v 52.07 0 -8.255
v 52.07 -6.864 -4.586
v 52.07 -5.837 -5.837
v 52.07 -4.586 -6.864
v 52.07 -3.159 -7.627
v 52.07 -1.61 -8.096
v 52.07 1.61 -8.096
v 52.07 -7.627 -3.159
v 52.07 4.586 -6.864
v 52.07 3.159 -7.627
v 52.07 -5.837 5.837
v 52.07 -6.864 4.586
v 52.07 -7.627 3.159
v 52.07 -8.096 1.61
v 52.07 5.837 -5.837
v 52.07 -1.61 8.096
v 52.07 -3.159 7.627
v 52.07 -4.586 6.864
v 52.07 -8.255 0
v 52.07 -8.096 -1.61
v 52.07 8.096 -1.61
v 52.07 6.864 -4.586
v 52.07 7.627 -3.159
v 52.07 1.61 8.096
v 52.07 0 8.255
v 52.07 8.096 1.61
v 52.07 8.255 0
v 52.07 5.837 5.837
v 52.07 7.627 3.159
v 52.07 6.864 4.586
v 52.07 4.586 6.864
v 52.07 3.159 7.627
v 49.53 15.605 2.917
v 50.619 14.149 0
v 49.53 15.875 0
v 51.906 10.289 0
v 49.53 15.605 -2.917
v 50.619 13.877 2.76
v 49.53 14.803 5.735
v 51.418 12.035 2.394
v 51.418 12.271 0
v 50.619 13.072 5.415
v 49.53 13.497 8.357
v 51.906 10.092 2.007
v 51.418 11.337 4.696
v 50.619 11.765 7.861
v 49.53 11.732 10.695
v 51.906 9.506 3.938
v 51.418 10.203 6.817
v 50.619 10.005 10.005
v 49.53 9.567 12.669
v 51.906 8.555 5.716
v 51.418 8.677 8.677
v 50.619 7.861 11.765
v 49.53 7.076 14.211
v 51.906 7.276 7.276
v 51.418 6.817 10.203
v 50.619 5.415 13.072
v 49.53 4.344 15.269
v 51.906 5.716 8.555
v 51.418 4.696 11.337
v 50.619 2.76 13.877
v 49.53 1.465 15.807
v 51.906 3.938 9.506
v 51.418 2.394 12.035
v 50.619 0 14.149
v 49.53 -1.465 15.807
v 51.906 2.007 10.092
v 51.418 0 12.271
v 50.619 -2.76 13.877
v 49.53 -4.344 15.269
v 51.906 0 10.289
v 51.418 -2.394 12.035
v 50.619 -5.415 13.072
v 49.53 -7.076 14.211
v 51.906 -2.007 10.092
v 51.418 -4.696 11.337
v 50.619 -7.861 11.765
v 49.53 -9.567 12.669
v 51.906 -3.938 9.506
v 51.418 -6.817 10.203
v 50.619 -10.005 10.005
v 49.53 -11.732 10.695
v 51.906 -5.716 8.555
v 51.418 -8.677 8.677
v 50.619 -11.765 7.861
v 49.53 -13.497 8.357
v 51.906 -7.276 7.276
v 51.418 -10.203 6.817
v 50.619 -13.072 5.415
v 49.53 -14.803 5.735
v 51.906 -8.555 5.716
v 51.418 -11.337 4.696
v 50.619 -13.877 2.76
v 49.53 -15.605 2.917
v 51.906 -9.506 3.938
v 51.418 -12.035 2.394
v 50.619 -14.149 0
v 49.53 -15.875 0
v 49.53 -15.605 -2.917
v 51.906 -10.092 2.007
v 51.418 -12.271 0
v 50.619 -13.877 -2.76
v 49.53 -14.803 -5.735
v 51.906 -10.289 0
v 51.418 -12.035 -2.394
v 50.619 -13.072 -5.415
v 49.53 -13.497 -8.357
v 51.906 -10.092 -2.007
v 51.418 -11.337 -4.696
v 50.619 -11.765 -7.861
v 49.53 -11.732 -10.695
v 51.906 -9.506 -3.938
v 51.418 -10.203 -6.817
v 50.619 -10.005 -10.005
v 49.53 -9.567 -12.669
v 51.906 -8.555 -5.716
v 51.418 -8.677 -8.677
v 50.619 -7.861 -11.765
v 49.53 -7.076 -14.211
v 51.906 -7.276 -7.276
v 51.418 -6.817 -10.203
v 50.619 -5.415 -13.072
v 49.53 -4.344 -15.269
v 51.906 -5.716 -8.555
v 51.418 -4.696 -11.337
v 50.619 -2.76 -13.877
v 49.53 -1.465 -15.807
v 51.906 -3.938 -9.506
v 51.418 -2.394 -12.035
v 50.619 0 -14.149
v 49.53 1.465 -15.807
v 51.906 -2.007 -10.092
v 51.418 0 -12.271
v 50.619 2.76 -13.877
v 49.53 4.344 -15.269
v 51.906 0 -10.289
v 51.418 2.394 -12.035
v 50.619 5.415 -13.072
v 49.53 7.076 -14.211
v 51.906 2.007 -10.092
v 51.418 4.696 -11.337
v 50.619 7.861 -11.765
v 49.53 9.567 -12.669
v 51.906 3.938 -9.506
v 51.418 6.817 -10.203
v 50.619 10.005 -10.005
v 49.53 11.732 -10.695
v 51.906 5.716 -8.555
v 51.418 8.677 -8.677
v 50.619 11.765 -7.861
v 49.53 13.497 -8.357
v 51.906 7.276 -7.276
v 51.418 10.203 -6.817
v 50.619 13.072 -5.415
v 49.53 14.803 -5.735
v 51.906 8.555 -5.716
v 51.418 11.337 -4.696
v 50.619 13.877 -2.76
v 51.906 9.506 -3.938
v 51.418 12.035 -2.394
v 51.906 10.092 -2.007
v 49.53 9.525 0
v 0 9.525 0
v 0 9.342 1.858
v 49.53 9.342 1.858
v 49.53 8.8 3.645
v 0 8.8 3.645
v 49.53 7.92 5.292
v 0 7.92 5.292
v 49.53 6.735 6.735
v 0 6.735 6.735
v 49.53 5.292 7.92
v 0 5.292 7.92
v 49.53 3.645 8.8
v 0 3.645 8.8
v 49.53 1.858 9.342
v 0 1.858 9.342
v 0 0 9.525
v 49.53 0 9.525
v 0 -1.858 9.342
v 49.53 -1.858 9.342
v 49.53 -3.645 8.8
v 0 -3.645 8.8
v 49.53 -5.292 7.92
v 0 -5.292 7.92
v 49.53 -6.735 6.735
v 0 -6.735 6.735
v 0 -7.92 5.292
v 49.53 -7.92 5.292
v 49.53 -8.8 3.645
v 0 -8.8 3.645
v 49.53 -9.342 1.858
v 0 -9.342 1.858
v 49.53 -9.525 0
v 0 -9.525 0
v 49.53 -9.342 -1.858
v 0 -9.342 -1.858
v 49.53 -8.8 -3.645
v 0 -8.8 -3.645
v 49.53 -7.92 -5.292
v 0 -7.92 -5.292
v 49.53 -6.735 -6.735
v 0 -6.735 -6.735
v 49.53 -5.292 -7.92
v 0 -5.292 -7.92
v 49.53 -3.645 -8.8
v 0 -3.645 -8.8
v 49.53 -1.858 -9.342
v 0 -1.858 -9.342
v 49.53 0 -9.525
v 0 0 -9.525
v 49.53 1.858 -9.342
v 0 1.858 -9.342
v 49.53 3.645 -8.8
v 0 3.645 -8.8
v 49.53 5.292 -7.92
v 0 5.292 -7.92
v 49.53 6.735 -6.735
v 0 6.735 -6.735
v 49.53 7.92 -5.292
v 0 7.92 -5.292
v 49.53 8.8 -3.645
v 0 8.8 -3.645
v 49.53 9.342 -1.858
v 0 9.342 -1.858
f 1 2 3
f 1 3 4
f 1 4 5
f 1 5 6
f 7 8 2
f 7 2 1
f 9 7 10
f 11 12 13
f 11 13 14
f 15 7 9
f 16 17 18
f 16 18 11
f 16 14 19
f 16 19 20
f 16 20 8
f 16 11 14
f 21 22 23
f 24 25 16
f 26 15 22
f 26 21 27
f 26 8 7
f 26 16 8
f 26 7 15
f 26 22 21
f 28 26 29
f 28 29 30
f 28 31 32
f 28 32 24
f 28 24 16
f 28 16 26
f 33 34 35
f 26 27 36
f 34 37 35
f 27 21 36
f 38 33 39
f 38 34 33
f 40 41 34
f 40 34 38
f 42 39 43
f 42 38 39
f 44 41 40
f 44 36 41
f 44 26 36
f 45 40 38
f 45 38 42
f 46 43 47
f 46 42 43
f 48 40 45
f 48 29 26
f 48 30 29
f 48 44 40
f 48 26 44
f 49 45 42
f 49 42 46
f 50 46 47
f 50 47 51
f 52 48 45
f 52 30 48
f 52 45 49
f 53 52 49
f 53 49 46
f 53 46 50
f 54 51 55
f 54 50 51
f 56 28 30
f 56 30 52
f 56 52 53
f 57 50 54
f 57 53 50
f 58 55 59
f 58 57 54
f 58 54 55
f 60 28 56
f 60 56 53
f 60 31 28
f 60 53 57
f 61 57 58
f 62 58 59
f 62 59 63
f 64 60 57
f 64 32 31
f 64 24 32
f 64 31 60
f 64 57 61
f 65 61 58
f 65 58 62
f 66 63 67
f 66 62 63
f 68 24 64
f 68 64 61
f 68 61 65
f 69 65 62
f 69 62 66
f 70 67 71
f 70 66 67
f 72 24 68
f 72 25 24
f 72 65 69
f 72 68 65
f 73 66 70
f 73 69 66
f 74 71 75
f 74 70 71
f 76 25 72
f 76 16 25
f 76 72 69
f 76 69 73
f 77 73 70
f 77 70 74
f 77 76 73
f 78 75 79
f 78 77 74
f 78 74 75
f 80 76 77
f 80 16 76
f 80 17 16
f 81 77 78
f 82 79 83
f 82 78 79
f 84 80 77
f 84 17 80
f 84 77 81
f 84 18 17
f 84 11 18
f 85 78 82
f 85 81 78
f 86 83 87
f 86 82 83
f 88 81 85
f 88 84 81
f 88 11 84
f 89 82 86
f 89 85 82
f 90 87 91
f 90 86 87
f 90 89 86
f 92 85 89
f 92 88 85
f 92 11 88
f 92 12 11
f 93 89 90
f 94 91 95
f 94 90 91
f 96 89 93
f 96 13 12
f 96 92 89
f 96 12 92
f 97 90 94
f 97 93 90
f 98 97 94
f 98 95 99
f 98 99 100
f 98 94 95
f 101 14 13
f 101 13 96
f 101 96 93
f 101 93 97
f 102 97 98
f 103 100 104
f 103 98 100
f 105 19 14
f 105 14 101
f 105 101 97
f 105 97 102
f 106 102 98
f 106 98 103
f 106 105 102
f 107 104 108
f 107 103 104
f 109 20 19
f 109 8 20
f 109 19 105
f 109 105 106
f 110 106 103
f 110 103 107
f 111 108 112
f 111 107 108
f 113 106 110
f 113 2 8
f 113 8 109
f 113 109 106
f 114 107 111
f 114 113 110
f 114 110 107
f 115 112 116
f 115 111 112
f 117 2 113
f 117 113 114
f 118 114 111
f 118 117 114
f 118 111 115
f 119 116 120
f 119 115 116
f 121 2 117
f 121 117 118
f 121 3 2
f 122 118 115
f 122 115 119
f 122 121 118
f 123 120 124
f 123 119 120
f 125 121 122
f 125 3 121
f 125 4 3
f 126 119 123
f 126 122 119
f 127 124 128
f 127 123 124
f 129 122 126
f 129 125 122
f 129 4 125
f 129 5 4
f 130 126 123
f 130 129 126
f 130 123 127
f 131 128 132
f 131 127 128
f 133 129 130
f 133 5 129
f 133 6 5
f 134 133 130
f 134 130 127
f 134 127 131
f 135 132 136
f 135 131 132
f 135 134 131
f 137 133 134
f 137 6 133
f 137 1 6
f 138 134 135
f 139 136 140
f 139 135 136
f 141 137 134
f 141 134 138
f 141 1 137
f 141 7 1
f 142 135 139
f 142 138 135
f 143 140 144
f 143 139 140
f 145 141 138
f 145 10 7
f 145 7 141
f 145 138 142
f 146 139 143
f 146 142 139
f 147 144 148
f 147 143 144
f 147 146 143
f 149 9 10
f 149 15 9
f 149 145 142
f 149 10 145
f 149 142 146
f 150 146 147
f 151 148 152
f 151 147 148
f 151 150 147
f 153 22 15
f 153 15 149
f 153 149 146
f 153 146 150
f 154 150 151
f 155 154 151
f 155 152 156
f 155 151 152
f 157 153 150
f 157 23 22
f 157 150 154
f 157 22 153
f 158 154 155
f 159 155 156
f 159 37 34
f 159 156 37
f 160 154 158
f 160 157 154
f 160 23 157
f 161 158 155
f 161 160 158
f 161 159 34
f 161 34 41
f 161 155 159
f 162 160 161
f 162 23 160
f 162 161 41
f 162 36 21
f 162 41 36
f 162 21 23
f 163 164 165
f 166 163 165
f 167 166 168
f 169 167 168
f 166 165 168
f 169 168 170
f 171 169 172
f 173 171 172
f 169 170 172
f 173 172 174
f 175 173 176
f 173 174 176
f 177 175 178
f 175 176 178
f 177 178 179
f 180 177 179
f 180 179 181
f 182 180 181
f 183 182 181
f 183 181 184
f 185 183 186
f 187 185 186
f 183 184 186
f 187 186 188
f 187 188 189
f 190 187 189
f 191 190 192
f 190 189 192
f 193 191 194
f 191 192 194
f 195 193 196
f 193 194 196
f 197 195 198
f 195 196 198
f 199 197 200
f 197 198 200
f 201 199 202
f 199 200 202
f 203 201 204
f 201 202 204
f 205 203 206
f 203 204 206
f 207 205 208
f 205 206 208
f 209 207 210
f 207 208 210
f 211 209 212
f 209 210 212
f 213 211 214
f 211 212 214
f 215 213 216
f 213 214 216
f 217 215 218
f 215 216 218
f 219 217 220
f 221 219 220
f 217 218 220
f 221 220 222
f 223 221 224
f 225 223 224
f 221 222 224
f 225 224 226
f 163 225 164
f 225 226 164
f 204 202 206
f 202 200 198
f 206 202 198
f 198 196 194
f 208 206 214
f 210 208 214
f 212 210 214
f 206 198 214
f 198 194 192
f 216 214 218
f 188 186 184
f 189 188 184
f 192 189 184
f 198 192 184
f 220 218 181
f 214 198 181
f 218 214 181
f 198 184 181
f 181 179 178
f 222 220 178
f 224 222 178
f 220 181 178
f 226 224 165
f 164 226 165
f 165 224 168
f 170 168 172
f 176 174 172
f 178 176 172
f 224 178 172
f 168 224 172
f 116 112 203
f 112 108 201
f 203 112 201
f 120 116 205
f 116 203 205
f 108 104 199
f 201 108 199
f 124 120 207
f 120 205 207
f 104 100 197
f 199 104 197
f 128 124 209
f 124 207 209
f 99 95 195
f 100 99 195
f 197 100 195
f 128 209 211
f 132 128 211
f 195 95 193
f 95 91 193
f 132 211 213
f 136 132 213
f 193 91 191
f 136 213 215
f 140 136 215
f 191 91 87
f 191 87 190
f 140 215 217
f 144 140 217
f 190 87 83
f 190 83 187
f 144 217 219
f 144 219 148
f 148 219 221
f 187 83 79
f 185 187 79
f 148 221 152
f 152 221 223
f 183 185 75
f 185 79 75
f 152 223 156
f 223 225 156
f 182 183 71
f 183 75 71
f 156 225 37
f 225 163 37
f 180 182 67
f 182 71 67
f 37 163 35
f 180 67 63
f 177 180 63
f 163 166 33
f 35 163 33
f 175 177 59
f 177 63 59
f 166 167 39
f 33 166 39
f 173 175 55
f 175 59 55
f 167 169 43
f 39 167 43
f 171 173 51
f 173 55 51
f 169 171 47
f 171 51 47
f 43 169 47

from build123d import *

# Parameters (mm, degrees)
F0_R     = 9.525
F1_DEPTH = 49.53
F2_R     = 15.875
F2_R_2   = 9.525
F3_DEPTH = 2.54


# Not quite as in the source:
# - a fillet or chamfer that OpenCascade refuses, or shapes differently, is made with other operations: its cross-section is extruded or revolved along the edge and cut away or added


with BuildPart() as f1:
    # F0 (on Right) → F1 (new body)
    with BuildSketch(Plane.YZ):
        Circle(F0_R)
    extrude(amount=F1_DEPTH)

    # F2 (on face) → F3 (join)
    with BuildSketch(Plane.YZ.offset(49.53)):
        Circle(F2_R)
        Circle(F2_R_2, mode=Mode.SUBTRACT)
        Circle(F2_R_2)
    extrude(amount=F3_DEPTH)

    # F4: fillet of radius 12.7 on 1 edges, made by hand

    # F4_s1 → F4_t2 (revolve, cut)
    with BuildSketch(Plane.XY):
        with BuildLine():
            ThreePointArc((49.53, 15.875), (51.4182778852, 12.2710926284), (52.07, 8.255))
            Line((52.07, 8.255), (52.07, 15.875))
            Line((52.07, 15.875), (49.53, 15.875))
        make_face()
    revolve(axis=Axis((52.07, 0, 0), (1, 0, 0)), mode=Mode.SUBTRACT)


solid = f1.part
